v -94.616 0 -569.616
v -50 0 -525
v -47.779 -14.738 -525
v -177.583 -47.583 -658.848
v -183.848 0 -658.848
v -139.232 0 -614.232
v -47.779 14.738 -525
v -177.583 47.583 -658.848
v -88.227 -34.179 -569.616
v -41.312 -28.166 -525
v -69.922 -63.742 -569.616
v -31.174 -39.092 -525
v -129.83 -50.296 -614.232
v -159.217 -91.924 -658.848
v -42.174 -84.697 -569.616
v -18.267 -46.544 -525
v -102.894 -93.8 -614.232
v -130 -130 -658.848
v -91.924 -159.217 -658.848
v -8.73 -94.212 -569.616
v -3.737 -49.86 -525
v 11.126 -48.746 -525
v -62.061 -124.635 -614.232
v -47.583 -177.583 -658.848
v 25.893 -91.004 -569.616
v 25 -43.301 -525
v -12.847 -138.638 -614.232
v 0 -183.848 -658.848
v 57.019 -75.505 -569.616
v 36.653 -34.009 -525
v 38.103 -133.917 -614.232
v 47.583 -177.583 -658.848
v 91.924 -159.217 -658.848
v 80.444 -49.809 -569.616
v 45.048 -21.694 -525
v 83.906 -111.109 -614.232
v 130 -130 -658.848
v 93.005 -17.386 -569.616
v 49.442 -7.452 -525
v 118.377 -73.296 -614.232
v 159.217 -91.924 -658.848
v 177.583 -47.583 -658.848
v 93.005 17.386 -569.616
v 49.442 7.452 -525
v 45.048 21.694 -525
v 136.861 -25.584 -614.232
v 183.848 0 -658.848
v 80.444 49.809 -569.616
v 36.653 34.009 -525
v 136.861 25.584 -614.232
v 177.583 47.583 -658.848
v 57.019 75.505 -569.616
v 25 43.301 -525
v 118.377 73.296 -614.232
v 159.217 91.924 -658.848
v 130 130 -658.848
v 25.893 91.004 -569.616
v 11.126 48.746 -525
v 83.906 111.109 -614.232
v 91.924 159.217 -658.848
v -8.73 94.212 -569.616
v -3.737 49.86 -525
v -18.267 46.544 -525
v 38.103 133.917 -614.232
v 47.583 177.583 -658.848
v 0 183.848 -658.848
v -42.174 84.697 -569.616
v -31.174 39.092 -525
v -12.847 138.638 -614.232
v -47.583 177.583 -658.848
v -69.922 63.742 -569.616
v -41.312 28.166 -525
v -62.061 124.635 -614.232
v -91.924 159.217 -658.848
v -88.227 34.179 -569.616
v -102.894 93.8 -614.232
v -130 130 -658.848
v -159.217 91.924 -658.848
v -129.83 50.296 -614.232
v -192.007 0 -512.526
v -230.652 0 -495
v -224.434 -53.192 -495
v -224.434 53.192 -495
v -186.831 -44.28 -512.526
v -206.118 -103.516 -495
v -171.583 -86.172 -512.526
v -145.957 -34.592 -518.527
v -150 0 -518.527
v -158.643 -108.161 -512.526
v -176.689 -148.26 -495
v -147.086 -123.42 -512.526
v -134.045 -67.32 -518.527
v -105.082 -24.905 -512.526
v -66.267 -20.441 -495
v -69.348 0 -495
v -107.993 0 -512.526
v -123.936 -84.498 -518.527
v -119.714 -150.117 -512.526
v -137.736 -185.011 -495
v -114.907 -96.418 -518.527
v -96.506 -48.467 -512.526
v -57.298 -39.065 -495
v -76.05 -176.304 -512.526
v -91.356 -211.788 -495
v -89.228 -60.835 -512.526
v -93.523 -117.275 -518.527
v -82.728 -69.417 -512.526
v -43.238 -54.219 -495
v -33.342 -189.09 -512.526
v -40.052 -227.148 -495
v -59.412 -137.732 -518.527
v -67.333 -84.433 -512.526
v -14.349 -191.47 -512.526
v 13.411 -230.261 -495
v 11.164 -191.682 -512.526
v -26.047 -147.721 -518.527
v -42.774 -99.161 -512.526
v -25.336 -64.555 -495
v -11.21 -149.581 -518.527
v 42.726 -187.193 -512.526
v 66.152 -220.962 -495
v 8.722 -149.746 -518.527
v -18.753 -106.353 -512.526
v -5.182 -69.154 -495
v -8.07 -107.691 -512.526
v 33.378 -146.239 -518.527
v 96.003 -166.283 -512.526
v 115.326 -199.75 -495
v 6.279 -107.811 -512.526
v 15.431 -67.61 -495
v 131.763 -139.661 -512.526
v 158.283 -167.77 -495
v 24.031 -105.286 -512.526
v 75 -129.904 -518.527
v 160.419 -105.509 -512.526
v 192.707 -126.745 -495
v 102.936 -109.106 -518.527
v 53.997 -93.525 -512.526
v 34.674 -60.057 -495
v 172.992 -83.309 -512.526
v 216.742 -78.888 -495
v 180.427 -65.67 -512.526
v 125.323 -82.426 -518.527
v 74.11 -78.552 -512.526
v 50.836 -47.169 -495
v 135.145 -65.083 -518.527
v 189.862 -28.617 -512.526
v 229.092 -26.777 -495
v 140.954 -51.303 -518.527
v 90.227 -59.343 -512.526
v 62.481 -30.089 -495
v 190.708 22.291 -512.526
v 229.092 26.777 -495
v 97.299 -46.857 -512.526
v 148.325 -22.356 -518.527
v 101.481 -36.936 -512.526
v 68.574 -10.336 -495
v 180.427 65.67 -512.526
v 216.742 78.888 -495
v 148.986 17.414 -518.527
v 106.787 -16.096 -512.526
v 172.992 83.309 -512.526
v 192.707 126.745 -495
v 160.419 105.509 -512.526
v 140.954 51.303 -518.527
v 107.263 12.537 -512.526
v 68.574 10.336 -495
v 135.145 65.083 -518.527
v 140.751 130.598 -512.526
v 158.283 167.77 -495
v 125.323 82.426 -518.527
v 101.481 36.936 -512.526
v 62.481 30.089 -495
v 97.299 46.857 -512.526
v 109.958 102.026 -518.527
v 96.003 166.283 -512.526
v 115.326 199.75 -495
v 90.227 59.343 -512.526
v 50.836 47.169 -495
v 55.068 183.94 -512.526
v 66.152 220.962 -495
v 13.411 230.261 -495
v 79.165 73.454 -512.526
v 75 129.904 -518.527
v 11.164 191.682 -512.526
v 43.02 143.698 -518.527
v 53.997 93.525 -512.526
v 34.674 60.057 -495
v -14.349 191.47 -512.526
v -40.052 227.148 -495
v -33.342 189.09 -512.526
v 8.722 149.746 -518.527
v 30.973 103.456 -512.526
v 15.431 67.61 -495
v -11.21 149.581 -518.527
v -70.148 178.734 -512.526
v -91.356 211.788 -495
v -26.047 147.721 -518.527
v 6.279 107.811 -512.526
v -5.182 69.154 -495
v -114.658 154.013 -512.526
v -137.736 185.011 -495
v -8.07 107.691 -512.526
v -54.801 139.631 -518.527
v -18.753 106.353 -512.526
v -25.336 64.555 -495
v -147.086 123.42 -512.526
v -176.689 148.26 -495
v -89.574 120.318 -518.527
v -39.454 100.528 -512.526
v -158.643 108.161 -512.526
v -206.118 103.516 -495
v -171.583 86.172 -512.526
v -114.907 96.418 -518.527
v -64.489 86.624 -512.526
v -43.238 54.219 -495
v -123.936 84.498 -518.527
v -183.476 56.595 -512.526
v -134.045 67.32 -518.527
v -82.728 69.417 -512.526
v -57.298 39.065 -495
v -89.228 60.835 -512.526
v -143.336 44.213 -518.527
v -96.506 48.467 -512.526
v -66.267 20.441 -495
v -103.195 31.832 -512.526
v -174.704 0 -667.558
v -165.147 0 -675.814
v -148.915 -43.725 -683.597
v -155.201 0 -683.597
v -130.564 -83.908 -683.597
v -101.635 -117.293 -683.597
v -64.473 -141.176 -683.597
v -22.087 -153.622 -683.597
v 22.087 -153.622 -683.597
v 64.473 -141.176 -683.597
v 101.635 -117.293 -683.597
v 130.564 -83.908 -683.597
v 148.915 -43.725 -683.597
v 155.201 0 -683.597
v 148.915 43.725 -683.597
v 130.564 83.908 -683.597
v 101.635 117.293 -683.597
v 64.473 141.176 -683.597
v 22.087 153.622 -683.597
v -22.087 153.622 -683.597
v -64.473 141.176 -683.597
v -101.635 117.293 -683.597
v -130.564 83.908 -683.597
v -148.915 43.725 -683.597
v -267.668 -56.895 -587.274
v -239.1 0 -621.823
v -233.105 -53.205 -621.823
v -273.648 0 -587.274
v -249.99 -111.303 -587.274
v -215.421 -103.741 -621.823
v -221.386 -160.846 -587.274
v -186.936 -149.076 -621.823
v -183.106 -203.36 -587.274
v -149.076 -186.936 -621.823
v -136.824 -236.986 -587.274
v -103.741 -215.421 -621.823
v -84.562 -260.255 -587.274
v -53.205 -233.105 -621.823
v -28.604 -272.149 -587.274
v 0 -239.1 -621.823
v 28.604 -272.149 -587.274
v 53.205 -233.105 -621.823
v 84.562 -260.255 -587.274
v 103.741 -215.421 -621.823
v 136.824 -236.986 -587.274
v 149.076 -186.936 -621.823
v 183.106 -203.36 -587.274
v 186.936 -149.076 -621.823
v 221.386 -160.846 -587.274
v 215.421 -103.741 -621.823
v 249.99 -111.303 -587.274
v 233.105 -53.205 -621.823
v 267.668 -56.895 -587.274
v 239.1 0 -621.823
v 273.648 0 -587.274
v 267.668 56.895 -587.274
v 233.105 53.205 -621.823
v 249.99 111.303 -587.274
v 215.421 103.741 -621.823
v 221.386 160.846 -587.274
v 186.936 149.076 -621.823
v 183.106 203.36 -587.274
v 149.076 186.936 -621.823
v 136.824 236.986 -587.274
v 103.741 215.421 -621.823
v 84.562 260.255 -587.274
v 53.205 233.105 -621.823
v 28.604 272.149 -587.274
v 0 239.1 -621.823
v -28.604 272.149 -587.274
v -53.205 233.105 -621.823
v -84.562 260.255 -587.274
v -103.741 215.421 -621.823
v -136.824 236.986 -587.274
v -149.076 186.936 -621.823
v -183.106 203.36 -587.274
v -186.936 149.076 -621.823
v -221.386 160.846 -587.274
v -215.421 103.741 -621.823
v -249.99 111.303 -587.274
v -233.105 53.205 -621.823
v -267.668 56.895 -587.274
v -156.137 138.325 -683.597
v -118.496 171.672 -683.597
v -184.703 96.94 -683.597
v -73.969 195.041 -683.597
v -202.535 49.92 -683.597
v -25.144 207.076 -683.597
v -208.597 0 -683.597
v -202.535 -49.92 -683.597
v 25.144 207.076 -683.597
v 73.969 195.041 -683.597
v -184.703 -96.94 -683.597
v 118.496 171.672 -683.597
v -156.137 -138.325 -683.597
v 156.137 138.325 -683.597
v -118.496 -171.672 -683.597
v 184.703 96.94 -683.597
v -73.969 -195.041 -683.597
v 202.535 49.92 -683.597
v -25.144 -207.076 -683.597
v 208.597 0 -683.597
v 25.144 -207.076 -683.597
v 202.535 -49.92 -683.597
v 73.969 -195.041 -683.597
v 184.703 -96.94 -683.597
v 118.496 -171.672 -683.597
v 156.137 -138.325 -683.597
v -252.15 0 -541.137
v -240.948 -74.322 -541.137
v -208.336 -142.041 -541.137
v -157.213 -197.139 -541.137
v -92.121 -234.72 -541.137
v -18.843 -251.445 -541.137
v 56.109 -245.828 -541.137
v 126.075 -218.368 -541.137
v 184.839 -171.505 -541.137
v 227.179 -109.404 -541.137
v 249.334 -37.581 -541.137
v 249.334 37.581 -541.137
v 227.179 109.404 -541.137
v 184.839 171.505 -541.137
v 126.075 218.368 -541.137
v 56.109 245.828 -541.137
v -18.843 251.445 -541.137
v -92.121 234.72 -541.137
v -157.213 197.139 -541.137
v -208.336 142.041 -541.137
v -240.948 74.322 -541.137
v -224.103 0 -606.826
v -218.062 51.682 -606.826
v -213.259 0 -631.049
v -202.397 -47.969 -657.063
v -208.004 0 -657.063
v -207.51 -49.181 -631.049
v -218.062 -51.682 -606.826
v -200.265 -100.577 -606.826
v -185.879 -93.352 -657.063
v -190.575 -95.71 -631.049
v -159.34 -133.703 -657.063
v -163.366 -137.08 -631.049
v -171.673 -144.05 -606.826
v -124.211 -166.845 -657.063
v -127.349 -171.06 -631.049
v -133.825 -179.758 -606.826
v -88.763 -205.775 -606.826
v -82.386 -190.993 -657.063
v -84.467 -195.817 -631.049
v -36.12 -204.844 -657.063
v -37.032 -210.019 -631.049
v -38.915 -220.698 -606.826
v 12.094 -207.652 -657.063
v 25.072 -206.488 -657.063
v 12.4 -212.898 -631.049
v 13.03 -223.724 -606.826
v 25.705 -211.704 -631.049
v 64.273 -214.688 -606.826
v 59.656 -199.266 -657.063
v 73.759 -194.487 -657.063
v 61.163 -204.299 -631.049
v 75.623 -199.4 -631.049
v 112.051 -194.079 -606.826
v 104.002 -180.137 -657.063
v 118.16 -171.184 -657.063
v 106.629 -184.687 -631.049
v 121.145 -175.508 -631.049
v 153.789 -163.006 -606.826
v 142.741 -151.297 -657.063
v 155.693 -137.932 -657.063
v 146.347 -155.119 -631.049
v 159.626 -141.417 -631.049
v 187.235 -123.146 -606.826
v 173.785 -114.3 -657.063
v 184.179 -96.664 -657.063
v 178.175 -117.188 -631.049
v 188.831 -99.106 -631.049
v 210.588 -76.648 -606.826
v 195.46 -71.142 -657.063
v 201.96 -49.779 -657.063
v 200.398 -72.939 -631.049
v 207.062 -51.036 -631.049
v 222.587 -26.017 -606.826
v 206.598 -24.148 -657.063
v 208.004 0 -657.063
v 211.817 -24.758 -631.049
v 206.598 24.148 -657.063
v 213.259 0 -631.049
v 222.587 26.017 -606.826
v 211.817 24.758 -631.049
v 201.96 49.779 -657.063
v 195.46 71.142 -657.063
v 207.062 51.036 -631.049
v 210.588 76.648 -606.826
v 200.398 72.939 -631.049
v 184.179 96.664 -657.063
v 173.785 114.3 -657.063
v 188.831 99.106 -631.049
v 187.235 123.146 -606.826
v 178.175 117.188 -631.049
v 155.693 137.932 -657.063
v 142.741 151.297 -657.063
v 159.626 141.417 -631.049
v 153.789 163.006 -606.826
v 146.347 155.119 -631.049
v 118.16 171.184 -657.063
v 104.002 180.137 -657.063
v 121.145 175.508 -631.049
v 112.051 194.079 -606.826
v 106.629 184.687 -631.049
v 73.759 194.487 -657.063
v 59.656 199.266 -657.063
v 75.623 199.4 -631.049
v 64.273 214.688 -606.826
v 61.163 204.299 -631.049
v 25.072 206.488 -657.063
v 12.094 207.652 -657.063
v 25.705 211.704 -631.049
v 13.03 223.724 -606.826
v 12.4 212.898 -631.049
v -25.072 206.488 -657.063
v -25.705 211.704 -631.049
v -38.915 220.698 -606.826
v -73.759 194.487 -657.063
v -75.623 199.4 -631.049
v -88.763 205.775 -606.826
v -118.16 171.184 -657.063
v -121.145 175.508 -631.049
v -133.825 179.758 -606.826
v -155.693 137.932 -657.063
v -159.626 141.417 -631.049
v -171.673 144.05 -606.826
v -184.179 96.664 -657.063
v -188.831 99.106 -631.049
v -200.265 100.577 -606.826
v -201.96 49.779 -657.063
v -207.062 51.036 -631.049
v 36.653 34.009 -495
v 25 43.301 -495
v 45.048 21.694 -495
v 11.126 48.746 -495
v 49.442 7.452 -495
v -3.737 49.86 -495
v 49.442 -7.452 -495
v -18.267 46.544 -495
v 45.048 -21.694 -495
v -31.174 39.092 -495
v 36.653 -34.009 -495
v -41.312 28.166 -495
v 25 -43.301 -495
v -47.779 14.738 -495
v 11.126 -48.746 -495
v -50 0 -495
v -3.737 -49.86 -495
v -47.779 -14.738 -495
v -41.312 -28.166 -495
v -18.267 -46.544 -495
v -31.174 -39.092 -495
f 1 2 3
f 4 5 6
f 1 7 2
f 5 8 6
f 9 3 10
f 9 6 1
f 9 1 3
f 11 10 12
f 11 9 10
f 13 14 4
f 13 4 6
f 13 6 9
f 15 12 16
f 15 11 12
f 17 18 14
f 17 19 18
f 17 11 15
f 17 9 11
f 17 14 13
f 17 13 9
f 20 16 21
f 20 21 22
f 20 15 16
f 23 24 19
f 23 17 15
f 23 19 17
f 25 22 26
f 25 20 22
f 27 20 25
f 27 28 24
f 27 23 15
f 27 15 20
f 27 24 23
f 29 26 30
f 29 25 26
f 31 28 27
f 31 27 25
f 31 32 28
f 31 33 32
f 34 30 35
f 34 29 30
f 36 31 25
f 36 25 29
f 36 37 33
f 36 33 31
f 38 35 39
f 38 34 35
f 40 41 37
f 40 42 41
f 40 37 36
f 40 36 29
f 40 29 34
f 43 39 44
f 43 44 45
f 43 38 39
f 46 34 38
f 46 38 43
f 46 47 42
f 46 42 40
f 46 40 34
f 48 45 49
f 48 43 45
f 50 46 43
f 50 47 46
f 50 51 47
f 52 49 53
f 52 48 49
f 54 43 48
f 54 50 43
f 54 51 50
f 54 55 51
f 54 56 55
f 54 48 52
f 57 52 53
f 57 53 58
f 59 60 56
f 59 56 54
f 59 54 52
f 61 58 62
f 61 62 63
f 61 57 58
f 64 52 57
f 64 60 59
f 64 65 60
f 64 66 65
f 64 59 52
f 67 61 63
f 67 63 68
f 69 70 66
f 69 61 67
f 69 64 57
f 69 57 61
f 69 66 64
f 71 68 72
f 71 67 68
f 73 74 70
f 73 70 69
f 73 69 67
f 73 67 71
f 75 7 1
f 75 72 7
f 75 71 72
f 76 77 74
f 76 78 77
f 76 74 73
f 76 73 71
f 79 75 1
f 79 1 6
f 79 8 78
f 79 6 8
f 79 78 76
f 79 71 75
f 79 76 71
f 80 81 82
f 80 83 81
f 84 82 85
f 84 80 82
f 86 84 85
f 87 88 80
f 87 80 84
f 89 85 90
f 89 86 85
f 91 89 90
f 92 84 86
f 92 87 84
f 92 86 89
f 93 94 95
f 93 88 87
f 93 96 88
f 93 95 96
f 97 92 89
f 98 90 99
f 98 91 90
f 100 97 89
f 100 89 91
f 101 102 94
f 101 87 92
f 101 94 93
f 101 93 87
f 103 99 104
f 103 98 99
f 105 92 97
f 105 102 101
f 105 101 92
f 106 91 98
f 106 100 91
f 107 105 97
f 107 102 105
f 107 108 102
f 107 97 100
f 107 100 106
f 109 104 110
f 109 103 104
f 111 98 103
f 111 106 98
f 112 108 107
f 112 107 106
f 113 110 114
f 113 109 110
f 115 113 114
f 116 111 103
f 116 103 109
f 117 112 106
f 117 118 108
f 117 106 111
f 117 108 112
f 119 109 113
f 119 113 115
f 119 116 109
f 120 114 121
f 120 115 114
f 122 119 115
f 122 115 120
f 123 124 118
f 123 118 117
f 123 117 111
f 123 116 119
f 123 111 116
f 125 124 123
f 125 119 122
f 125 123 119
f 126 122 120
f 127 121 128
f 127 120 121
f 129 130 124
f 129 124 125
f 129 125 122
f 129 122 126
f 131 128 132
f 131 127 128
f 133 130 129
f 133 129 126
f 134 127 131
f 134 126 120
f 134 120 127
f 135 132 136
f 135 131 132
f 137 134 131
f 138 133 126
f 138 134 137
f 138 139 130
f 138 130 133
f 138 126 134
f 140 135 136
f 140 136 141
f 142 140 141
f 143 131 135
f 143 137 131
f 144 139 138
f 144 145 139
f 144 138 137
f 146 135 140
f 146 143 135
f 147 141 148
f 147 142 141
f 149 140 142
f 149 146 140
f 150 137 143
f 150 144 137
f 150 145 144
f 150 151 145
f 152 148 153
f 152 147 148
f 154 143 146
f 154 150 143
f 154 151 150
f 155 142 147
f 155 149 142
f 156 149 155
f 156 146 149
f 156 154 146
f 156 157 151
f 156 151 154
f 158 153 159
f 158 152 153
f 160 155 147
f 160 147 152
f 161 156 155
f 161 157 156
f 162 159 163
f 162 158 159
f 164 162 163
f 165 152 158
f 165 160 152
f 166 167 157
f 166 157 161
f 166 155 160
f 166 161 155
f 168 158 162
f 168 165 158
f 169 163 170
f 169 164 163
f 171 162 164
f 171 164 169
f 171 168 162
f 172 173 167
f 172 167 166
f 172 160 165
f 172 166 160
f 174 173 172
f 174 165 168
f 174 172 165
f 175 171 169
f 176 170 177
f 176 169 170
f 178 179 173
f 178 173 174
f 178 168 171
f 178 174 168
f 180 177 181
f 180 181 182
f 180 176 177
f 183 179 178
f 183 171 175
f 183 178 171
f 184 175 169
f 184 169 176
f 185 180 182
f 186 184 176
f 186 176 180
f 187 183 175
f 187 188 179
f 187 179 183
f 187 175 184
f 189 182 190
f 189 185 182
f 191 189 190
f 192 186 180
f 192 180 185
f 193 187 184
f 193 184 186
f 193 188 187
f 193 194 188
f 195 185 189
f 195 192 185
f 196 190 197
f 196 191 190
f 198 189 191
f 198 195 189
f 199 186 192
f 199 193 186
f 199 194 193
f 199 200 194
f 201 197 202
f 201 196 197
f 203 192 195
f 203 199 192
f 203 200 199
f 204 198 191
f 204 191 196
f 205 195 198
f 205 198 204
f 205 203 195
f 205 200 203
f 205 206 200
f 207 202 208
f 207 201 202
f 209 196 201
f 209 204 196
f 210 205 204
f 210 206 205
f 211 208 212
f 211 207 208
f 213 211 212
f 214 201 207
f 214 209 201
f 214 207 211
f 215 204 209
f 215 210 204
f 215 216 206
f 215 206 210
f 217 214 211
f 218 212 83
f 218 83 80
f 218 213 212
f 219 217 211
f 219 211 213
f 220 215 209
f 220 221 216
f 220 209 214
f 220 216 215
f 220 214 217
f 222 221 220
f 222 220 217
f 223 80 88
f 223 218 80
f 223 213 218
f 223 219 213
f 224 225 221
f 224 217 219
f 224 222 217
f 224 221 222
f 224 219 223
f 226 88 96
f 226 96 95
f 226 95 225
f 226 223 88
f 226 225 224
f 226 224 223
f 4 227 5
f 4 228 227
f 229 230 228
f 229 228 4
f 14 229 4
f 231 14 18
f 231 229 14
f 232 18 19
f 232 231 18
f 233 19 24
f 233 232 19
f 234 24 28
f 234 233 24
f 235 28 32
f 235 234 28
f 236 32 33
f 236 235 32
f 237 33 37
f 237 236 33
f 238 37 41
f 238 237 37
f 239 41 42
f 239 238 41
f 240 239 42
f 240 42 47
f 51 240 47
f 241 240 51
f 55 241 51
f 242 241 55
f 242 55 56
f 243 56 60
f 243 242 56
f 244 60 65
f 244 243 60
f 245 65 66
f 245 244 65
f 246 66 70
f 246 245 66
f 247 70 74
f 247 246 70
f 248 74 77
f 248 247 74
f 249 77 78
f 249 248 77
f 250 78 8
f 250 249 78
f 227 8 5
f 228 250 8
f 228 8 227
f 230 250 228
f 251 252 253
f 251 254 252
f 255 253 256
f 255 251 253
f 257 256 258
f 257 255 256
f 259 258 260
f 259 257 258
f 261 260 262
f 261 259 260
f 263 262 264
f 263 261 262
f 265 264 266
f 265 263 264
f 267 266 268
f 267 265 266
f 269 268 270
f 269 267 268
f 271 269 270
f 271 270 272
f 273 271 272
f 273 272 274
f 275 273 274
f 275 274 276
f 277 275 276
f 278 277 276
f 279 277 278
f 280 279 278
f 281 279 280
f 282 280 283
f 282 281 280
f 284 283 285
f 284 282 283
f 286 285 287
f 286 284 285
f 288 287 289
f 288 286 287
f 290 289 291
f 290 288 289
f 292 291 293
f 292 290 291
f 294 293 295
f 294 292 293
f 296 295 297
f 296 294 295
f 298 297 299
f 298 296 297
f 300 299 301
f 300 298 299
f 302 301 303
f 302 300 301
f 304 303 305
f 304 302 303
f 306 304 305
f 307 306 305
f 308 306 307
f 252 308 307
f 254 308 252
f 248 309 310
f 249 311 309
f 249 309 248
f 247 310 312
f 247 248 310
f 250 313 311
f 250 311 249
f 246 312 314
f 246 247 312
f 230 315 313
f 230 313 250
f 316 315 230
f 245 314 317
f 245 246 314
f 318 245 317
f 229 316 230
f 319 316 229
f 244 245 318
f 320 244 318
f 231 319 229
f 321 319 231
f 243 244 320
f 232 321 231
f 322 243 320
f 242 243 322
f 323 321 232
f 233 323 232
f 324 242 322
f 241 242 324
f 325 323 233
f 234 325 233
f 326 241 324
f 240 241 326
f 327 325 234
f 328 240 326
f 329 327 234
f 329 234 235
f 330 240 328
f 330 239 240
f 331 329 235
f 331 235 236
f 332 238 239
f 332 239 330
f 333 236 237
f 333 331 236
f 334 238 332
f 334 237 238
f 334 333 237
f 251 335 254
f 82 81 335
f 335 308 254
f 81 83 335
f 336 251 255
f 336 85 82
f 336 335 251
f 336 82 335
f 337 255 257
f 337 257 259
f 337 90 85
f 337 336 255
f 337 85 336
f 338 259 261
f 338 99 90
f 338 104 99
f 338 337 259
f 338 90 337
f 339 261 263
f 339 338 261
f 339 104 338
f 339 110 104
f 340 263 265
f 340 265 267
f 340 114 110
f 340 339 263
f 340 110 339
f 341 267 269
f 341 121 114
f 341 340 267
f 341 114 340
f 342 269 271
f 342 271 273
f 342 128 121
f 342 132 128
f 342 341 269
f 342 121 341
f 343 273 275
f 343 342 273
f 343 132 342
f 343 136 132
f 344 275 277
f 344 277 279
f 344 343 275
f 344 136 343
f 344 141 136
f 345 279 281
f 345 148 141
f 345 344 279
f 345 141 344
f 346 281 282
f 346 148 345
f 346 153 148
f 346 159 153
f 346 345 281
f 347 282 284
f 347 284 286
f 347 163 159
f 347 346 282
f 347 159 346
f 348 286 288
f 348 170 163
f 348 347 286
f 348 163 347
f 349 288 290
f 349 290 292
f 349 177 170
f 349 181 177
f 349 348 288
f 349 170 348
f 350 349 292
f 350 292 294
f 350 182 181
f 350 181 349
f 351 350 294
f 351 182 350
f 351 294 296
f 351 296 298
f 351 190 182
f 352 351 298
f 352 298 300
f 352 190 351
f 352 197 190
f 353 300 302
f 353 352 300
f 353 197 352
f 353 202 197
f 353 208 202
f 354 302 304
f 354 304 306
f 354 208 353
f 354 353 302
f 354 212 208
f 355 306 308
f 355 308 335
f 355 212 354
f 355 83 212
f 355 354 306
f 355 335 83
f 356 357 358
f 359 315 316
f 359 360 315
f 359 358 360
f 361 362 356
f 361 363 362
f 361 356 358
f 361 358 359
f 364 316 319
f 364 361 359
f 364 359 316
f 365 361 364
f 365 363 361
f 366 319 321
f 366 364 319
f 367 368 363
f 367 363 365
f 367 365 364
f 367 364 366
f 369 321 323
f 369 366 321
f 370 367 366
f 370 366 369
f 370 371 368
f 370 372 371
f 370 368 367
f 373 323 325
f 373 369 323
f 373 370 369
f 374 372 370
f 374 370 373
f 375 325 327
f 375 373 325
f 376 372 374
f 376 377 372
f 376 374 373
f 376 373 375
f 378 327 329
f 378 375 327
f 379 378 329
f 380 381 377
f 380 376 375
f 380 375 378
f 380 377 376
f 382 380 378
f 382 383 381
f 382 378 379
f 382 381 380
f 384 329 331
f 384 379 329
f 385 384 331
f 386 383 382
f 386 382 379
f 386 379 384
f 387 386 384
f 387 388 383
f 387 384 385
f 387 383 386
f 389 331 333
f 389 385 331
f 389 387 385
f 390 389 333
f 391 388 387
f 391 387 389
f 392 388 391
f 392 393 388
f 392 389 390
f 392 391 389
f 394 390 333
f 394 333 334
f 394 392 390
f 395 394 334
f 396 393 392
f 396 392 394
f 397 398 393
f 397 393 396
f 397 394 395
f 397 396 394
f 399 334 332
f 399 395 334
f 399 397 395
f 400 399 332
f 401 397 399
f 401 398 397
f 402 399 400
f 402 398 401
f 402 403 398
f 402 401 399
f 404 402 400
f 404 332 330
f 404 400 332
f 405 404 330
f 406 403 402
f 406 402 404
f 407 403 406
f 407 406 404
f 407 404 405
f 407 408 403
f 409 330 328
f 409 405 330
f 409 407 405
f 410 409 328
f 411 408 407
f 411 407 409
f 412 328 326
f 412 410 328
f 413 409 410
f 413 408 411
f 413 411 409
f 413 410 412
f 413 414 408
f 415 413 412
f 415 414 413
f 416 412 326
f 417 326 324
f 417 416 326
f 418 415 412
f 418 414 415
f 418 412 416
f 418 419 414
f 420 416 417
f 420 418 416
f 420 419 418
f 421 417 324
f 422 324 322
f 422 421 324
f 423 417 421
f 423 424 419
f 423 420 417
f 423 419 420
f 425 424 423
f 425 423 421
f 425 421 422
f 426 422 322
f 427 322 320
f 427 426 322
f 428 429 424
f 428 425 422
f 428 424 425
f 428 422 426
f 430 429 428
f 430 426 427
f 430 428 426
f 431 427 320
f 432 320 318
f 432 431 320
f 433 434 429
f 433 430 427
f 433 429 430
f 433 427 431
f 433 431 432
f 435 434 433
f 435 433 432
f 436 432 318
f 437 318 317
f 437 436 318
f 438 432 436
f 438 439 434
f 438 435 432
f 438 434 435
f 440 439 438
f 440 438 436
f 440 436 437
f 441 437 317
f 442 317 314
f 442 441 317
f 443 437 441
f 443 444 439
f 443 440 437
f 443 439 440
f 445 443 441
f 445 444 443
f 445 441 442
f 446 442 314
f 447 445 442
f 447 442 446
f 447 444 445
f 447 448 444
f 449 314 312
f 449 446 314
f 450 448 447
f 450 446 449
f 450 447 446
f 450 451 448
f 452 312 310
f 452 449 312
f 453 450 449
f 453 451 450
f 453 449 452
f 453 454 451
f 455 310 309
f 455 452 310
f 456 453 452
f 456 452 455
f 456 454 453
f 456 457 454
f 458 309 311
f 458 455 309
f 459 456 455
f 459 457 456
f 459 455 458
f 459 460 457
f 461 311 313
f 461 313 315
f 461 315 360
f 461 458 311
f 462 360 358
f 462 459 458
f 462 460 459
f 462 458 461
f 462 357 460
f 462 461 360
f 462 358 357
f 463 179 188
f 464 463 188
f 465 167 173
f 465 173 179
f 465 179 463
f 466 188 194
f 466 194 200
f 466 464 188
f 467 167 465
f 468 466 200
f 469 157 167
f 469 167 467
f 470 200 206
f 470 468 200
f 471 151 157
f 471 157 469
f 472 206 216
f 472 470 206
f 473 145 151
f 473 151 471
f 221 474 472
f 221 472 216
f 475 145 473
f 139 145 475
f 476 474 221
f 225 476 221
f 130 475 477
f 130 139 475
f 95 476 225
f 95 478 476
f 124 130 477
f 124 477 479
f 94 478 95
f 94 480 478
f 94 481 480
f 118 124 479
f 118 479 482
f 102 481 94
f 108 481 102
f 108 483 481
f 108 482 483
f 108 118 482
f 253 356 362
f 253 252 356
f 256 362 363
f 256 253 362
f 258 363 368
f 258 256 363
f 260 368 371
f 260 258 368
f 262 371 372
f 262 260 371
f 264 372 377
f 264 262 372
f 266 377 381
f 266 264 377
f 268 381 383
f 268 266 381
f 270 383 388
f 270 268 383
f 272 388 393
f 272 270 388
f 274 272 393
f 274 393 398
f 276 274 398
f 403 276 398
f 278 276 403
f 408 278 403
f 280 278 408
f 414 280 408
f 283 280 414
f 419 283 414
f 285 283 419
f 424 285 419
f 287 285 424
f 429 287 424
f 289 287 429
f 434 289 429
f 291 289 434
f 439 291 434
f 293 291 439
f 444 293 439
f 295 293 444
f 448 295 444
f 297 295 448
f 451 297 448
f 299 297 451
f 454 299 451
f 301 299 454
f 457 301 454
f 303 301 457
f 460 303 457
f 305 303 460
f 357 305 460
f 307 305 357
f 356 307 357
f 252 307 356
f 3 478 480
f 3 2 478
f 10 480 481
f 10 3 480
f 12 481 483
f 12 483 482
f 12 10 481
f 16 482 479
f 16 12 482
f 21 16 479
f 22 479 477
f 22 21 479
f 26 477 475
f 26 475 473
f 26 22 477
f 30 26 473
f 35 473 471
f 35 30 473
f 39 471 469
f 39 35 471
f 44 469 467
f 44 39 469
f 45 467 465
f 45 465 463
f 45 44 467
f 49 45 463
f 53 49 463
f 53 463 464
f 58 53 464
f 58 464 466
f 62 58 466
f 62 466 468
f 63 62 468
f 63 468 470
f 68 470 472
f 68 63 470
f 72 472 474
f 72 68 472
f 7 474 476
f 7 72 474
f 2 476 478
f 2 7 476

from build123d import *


with BuildPart() as part:
    # Hatch Sketch → Hatch Revolution (revolve)
    with BuildSketch(Plane(origin=(0, 0, 0), x_dir=(0, 0, -1), z_dir=(1, 0, 0)), mode=Mode.PRIVATE) as hatch_revolution_sk:
        with BuildLine():
            Line((587.274308735, 273.648124971), (495, 230.651707126))
            ThreePointArc((495, 230.651707126), (518.527464888, 150), (495, 69.348292874))
            Line((495, 69.348292874), (495, 50))
            Line((495, 50), (525, 50))
            Line((525, 50), (658.847763109, 183.847763109))
            ThreePointArc((658.847763109, 183.847763109), (671.744192687, 169.975653092), (683.59650045, 155.201481952))
            Line((683.59650045, 155.201481952), (683.59650045, 208.59650045))
            ThreePointArc((683.59650045, 208.59650045), (643.910388309, 209.909991295), (606.825613004, 224.102672354))
            Line((606.825613004, 224.102672354), (621.822687178, 239.099746528))
            Line((621.822687178, 239.099746528), (587.274308735, 273.648124971))
        make_face()
    revolve(hatch_revolution_sk.sketch.rotate(Axis((0, 0, -546.1), (0, 0, 1)), 90), axis=Axis((0, 0, -546.1), (0, 0, 1)))


solid = part.part
